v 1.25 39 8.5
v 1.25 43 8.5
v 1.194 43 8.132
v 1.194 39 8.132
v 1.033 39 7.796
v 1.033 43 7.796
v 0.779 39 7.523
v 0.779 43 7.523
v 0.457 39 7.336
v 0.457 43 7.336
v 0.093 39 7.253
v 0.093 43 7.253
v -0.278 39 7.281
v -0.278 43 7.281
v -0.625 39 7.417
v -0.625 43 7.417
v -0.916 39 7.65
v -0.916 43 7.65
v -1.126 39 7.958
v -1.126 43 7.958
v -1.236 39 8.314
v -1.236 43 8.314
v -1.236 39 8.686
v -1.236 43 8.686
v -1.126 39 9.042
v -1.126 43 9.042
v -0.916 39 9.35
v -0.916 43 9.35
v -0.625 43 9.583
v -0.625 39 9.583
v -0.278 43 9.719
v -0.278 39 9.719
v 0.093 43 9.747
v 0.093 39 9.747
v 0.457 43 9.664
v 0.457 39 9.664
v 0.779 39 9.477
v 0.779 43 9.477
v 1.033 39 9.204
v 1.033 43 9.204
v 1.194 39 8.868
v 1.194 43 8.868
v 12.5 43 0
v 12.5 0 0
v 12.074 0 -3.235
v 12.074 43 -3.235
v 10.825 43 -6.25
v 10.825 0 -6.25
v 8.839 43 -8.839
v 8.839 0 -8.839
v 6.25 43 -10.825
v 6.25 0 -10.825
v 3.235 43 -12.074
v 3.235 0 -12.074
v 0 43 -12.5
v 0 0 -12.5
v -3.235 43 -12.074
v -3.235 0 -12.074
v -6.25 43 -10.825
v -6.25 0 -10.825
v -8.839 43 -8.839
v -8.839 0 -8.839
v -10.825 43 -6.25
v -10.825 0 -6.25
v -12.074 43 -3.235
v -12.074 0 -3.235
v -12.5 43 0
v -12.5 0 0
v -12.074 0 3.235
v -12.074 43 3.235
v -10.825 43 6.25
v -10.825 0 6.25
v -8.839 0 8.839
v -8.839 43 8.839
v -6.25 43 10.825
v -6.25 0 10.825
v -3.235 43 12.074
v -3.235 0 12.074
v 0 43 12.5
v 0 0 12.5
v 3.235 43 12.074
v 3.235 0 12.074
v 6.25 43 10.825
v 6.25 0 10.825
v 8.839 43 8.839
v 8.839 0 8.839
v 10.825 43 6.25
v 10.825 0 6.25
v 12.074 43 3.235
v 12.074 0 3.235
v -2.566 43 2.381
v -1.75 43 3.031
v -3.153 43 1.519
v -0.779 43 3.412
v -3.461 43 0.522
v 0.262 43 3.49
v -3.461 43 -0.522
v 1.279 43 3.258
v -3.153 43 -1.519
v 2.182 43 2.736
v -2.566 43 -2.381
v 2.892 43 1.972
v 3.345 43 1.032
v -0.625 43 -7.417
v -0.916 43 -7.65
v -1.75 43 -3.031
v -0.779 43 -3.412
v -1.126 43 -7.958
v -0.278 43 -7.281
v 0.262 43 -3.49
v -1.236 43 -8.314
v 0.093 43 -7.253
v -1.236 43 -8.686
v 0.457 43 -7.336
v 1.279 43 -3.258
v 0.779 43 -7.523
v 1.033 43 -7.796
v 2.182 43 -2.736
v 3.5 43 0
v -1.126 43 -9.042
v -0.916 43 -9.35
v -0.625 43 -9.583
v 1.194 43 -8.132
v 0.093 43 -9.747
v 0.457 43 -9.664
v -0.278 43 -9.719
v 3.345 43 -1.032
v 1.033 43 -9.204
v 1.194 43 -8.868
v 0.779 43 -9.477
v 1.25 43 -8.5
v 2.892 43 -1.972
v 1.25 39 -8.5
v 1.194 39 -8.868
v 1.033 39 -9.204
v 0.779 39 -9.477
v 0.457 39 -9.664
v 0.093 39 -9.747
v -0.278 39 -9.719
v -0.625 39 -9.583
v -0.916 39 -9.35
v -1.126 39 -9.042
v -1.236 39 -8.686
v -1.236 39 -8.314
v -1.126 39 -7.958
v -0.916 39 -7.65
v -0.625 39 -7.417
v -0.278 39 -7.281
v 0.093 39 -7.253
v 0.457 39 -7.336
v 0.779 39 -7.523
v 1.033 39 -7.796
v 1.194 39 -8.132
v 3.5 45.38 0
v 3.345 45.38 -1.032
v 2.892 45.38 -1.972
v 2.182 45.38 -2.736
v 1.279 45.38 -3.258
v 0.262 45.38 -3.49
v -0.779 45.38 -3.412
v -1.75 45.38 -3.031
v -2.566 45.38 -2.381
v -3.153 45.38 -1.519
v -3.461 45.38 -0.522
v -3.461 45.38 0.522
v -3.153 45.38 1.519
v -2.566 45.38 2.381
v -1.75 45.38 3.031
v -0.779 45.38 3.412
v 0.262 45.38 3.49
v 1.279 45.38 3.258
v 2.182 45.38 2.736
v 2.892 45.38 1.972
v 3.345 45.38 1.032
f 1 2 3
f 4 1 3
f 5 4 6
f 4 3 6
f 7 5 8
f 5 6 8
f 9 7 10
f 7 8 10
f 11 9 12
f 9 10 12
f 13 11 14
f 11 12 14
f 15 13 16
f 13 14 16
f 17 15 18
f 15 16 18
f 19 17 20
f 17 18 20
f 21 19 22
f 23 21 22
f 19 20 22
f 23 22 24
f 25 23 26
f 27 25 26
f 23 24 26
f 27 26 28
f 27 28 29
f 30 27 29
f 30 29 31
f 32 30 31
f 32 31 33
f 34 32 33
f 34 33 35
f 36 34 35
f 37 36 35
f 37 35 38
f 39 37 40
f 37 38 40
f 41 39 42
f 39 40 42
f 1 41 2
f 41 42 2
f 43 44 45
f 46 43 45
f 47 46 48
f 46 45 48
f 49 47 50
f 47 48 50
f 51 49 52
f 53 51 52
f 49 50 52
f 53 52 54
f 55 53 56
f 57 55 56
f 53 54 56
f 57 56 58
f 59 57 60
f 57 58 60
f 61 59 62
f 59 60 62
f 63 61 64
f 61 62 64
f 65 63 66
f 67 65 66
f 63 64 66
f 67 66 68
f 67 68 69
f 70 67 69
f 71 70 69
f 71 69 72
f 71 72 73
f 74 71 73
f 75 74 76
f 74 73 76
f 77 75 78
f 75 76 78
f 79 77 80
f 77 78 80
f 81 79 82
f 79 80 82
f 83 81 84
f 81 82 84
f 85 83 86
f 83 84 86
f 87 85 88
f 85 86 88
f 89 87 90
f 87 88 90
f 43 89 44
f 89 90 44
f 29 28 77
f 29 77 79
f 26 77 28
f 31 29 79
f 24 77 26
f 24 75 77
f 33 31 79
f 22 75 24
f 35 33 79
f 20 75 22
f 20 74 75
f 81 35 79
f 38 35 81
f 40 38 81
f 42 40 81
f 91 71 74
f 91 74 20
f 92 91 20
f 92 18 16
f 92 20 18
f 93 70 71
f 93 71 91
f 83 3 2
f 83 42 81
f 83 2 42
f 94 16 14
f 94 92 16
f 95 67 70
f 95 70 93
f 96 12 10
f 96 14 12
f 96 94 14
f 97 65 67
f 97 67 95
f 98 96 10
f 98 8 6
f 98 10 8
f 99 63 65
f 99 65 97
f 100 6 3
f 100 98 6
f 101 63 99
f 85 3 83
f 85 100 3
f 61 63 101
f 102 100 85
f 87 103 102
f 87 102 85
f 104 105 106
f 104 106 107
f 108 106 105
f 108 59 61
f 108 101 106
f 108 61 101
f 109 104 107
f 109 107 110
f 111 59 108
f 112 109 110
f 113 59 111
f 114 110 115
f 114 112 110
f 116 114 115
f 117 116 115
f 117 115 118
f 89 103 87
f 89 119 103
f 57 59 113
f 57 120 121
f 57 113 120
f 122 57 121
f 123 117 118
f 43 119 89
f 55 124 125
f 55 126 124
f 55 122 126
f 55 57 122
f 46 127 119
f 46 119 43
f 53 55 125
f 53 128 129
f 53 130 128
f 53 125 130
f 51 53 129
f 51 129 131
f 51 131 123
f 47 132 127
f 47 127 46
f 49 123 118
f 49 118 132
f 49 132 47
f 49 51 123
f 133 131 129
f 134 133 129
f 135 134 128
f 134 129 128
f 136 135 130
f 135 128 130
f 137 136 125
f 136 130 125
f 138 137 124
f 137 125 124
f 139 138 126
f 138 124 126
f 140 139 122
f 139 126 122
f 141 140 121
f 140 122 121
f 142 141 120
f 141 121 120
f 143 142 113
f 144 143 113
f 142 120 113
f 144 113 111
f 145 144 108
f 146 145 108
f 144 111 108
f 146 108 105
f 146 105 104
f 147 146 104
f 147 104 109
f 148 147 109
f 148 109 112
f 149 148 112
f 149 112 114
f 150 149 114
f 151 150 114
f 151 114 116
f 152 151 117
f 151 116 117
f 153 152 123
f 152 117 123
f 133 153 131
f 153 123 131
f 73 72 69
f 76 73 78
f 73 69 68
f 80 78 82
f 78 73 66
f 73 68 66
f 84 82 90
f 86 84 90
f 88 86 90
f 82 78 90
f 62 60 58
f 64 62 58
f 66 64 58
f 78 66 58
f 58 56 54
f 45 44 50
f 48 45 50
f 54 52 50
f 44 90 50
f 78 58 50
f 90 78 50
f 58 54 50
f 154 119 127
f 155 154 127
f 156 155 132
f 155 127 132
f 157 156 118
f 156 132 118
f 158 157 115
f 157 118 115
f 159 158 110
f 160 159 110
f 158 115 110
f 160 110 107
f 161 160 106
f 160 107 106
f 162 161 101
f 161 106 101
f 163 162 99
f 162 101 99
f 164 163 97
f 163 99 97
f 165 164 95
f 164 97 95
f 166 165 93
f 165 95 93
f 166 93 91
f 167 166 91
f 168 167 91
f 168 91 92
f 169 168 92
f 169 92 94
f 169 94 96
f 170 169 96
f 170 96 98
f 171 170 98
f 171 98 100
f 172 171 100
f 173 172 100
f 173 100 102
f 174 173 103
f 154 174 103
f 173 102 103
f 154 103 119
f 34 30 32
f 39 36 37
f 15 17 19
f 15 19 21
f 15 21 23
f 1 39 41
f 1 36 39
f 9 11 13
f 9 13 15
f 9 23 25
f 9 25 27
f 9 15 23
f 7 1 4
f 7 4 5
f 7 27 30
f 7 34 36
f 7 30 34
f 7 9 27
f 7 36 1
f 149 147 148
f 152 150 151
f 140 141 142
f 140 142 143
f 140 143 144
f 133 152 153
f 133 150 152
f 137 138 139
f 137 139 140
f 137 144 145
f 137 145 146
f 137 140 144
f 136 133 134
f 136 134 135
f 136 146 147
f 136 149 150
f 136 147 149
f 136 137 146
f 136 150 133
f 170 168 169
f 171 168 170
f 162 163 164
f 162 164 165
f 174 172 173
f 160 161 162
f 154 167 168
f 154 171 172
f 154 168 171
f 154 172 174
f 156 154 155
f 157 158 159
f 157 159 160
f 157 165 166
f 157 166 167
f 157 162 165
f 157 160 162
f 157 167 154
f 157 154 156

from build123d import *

# Parameters (mm, degrees)
SKETCH1_R           = 12.5
BOSS_EXTRUDE1_DEPTH = 43
SKETCH2_R           = 3.5
BOSS_EXTRUDE2_DEPTH = 2.38
SKETCH3_R           = 1.25
CUT_EXTRUDE1_DEPTH  = 4


with BuildPart() as part:
    # Sketch1 → Boss-Extrude1 (new body)
    with BuildSketch(Plane(origin=(0, 0, 0), x_dir=(1, 0, 0), z_dir=(0, 1, 0))):
        Circle(SKETCH1_R)
    extrude(amount=BOSS_EXTRUDE1_DEPTH)

    # Sketch2 → Boss-Extrude2 (add)
    with BuildSketch(Plane(origin=(0, 43, 0), x_dir=(1, 0, 0), z_dir=(0, 1, 0))):
        Circle(SKETCH2_R)
    extrude(amount=BOSS_EXTRUDE2_DEPTH)

    # Sketch3 → Cut-Extrude1 (cut)
    with BuildSketch(Plane(origin=(0, 43, 0), x_dir=(1, 0, 0), z_dir=(0, 1, 0))):
        with Locations((0, 8.5)):
            Circle(SKETCH3_R)
        with Locations((0, -8.5)):
            Circle(SKETCH3_R)
    extrude(amount=-CUT_EXTRUDE1_DEPTH, mode=Mode.SUBTRACT)


solid = part.part
